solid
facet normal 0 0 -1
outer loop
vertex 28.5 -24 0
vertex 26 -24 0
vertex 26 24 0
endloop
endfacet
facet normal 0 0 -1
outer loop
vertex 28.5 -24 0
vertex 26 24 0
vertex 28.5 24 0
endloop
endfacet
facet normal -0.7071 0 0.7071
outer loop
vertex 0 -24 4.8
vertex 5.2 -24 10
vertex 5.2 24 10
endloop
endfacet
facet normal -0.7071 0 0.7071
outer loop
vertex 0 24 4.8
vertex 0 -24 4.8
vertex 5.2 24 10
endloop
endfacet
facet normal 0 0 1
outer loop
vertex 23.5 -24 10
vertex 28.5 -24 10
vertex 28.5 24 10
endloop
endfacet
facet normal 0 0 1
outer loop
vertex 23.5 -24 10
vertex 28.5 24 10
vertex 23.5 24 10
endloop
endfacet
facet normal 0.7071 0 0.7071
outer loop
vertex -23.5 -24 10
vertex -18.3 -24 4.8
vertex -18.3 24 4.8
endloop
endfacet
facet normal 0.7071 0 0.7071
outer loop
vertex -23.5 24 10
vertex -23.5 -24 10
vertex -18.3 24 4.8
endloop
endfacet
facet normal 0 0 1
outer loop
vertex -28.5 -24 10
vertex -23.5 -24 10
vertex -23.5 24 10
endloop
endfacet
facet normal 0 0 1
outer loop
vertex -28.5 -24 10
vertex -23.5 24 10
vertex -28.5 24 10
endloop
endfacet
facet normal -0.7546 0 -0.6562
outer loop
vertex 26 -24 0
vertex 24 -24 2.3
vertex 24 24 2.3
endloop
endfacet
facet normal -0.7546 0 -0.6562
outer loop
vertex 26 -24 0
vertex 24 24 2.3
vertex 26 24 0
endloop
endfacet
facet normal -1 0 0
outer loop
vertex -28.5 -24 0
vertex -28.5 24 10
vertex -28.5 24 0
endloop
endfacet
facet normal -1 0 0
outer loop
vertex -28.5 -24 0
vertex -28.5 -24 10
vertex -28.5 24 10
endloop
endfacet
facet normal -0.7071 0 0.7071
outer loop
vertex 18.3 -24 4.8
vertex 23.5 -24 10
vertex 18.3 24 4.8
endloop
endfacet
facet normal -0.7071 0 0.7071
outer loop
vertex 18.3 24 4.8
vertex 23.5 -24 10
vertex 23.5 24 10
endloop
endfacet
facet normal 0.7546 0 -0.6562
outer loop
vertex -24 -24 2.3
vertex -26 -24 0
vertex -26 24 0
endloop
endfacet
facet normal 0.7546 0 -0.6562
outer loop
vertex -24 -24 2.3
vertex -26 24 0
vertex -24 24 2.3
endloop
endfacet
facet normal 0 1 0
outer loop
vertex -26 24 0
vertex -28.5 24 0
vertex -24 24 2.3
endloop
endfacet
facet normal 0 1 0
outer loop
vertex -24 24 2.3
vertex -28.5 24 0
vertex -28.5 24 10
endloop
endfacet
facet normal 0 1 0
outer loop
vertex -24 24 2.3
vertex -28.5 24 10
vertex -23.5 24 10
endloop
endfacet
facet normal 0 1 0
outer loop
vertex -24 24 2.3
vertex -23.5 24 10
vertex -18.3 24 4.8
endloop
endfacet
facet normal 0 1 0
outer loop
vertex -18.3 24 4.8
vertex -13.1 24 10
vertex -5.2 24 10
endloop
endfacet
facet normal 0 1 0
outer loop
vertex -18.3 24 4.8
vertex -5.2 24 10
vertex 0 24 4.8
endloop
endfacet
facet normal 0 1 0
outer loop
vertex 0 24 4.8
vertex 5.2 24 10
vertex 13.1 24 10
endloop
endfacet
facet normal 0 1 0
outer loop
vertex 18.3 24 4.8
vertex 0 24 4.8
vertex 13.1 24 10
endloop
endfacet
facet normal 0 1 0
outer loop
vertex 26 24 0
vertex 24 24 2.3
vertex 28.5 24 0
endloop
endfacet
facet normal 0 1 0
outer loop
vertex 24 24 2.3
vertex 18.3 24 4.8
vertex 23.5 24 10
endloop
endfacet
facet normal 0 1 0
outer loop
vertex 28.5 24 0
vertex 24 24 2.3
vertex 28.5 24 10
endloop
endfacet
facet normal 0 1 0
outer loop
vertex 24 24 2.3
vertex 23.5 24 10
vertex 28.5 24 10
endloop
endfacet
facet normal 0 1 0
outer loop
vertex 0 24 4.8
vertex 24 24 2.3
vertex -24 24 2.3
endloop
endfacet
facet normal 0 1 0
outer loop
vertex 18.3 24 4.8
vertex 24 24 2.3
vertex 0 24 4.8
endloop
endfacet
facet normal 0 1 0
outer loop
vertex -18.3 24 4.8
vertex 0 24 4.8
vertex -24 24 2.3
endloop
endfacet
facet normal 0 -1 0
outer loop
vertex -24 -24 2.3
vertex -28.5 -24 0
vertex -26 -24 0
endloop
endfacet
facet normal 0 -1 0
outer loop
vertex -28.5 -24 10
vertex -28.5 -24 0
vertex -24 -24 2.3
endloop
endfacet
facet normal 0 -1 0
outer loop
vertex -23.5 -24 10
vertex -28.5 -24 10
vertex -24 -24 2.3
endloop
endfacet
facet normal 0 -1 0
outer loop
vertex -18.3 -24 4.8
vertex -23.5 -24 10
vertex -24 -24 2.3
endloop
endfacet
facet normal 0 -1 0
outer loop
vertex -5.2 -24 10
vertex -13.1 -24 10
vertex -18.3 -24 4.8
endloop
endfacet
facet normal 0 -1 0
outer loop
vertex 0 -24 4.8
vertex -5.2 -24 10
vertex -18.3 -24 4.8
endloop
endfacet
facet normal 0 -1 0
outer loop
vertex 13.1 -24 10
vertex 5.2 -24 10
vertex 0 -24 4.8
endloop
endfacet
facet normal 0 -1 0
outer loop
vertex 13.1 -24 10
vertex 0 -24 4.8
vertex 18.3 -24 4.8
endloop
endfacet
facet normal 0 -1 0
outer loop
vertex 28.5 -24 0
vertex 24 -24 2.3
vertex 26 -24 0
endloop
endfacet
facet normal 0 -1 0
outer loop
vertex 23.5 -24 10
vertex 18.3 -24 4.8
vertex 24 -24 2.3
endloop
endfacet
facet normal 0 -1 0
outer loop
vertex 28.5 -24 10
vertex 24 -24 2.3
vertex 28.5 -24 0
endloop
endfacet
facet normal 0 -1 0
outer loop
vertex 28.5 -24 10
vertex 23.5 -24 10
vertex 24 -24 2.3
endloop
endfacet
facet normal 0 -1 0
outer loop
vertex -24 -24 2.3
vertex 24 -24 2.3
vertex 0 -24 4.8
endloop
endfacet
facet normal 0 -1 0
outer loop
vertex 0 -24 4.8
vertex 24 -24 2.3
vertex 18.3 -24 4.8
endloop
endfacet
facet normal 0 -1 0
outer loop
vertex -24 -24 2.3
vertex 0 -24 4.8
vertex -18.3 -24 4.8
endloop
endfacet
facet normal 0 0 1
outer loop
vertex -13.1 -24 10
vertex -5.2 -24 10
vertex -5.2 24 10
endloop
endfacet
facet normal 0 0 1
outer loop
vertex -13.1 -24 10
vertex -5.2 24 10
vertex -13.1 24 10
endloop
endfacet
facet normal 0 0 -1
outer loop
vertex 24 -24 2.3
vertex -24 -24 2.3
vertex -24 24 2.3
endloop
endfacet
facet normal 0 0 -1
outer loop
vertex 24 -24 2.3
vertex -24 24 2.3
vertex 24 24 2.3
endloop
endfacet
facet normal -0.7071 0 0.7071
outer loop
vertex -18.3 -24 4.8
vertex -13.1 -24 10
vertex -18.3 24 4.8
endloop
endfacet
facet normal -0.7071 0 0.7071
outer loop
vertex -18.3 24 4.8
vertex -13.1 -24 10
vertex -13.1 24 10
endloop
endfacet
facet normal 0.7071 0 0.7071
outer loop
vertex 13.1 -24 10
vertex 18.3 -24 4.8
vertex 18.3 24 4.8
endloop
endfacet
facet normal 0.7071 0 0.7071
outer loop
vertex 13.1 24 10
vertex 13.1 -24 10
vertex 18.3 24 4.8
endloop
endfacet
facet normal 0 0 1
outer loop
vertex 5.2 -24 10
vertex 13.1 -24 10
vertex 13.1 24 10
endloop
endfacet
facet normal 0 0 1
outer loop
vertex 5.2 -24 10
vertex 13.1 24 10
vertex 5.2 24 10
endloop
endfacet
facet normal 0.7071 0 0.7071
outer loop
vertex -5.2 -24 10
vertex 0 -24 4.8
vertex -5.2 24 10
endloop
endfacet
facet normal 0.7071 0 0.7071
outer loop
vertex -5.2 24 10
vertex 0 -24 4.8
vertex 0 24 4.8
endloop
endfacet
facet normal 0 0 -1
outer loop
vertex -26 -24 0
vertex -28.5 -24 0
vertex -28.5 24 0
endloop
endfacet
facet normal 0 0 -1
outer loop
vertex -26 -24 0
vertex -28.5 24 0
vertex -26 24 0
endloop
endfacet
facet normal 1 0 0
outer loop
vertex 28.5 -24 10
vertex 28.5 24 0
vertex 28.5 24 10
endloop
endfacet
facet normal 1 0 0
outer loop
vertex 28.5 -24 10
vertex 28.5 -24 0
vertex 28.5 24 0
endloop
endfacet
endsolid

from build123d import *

# Parameters (mm, degrees)
F1_DEPTH = 24
F3_W     = 10.4
F3_H     = 48
F4_DEPTH = 5.2
F5_SIZE  = 5.19999


# Not quite as in the source:
# - a fillet or chamfer is up to 0.001 mm smaller than in the source, because OpenCascade refuses the exact size


with BuildPart() as f1:
    # F0 (on Front) → F1 (new body, symmetric)
    with BuildSketch(Plane.XZ):
        Polygon((-28.5, 10), (-28.5, 0), (-26, 0), (-24, 2.3), (24, 2.3), (26, 0), (28.5, 0), (28.5, 10), align=None)
    extrude(amount=F1_DEPTH, both=True)

    # F3 (on offset) → F4 (cut)
    with BuildSketch(Plane.XY.offset(10)):
        with Locations((-18.3, 0)):
            Rectangle(F3_W, F3_H)
        Rectangle(F3_W, F3_H)
        with Locations((18.3, 0)):
            Rectangle(F3_W, F3_H)
    extrude(amount=-F4_DEPTH, mode=Mode.SUBTRACT)

    # F5 (size 5.2 in the source; OpenCascade refuses exactly that, so slightly less here)
    f5_edges = [f1.edges().sort_by_distance(p)[0] for p in [
        (-13.1, 0, 4.8),
        (-23.5, 0, 4.8),
        (-5.2, 0, 4.8),
        (5.2, 0, 4.8),
        (13.1, 0, 4.8),
        (23.5, 0, 4.8),
    ]]
    chamfer(f5_edges, length=F5_SIZE)


solid = f1.part
